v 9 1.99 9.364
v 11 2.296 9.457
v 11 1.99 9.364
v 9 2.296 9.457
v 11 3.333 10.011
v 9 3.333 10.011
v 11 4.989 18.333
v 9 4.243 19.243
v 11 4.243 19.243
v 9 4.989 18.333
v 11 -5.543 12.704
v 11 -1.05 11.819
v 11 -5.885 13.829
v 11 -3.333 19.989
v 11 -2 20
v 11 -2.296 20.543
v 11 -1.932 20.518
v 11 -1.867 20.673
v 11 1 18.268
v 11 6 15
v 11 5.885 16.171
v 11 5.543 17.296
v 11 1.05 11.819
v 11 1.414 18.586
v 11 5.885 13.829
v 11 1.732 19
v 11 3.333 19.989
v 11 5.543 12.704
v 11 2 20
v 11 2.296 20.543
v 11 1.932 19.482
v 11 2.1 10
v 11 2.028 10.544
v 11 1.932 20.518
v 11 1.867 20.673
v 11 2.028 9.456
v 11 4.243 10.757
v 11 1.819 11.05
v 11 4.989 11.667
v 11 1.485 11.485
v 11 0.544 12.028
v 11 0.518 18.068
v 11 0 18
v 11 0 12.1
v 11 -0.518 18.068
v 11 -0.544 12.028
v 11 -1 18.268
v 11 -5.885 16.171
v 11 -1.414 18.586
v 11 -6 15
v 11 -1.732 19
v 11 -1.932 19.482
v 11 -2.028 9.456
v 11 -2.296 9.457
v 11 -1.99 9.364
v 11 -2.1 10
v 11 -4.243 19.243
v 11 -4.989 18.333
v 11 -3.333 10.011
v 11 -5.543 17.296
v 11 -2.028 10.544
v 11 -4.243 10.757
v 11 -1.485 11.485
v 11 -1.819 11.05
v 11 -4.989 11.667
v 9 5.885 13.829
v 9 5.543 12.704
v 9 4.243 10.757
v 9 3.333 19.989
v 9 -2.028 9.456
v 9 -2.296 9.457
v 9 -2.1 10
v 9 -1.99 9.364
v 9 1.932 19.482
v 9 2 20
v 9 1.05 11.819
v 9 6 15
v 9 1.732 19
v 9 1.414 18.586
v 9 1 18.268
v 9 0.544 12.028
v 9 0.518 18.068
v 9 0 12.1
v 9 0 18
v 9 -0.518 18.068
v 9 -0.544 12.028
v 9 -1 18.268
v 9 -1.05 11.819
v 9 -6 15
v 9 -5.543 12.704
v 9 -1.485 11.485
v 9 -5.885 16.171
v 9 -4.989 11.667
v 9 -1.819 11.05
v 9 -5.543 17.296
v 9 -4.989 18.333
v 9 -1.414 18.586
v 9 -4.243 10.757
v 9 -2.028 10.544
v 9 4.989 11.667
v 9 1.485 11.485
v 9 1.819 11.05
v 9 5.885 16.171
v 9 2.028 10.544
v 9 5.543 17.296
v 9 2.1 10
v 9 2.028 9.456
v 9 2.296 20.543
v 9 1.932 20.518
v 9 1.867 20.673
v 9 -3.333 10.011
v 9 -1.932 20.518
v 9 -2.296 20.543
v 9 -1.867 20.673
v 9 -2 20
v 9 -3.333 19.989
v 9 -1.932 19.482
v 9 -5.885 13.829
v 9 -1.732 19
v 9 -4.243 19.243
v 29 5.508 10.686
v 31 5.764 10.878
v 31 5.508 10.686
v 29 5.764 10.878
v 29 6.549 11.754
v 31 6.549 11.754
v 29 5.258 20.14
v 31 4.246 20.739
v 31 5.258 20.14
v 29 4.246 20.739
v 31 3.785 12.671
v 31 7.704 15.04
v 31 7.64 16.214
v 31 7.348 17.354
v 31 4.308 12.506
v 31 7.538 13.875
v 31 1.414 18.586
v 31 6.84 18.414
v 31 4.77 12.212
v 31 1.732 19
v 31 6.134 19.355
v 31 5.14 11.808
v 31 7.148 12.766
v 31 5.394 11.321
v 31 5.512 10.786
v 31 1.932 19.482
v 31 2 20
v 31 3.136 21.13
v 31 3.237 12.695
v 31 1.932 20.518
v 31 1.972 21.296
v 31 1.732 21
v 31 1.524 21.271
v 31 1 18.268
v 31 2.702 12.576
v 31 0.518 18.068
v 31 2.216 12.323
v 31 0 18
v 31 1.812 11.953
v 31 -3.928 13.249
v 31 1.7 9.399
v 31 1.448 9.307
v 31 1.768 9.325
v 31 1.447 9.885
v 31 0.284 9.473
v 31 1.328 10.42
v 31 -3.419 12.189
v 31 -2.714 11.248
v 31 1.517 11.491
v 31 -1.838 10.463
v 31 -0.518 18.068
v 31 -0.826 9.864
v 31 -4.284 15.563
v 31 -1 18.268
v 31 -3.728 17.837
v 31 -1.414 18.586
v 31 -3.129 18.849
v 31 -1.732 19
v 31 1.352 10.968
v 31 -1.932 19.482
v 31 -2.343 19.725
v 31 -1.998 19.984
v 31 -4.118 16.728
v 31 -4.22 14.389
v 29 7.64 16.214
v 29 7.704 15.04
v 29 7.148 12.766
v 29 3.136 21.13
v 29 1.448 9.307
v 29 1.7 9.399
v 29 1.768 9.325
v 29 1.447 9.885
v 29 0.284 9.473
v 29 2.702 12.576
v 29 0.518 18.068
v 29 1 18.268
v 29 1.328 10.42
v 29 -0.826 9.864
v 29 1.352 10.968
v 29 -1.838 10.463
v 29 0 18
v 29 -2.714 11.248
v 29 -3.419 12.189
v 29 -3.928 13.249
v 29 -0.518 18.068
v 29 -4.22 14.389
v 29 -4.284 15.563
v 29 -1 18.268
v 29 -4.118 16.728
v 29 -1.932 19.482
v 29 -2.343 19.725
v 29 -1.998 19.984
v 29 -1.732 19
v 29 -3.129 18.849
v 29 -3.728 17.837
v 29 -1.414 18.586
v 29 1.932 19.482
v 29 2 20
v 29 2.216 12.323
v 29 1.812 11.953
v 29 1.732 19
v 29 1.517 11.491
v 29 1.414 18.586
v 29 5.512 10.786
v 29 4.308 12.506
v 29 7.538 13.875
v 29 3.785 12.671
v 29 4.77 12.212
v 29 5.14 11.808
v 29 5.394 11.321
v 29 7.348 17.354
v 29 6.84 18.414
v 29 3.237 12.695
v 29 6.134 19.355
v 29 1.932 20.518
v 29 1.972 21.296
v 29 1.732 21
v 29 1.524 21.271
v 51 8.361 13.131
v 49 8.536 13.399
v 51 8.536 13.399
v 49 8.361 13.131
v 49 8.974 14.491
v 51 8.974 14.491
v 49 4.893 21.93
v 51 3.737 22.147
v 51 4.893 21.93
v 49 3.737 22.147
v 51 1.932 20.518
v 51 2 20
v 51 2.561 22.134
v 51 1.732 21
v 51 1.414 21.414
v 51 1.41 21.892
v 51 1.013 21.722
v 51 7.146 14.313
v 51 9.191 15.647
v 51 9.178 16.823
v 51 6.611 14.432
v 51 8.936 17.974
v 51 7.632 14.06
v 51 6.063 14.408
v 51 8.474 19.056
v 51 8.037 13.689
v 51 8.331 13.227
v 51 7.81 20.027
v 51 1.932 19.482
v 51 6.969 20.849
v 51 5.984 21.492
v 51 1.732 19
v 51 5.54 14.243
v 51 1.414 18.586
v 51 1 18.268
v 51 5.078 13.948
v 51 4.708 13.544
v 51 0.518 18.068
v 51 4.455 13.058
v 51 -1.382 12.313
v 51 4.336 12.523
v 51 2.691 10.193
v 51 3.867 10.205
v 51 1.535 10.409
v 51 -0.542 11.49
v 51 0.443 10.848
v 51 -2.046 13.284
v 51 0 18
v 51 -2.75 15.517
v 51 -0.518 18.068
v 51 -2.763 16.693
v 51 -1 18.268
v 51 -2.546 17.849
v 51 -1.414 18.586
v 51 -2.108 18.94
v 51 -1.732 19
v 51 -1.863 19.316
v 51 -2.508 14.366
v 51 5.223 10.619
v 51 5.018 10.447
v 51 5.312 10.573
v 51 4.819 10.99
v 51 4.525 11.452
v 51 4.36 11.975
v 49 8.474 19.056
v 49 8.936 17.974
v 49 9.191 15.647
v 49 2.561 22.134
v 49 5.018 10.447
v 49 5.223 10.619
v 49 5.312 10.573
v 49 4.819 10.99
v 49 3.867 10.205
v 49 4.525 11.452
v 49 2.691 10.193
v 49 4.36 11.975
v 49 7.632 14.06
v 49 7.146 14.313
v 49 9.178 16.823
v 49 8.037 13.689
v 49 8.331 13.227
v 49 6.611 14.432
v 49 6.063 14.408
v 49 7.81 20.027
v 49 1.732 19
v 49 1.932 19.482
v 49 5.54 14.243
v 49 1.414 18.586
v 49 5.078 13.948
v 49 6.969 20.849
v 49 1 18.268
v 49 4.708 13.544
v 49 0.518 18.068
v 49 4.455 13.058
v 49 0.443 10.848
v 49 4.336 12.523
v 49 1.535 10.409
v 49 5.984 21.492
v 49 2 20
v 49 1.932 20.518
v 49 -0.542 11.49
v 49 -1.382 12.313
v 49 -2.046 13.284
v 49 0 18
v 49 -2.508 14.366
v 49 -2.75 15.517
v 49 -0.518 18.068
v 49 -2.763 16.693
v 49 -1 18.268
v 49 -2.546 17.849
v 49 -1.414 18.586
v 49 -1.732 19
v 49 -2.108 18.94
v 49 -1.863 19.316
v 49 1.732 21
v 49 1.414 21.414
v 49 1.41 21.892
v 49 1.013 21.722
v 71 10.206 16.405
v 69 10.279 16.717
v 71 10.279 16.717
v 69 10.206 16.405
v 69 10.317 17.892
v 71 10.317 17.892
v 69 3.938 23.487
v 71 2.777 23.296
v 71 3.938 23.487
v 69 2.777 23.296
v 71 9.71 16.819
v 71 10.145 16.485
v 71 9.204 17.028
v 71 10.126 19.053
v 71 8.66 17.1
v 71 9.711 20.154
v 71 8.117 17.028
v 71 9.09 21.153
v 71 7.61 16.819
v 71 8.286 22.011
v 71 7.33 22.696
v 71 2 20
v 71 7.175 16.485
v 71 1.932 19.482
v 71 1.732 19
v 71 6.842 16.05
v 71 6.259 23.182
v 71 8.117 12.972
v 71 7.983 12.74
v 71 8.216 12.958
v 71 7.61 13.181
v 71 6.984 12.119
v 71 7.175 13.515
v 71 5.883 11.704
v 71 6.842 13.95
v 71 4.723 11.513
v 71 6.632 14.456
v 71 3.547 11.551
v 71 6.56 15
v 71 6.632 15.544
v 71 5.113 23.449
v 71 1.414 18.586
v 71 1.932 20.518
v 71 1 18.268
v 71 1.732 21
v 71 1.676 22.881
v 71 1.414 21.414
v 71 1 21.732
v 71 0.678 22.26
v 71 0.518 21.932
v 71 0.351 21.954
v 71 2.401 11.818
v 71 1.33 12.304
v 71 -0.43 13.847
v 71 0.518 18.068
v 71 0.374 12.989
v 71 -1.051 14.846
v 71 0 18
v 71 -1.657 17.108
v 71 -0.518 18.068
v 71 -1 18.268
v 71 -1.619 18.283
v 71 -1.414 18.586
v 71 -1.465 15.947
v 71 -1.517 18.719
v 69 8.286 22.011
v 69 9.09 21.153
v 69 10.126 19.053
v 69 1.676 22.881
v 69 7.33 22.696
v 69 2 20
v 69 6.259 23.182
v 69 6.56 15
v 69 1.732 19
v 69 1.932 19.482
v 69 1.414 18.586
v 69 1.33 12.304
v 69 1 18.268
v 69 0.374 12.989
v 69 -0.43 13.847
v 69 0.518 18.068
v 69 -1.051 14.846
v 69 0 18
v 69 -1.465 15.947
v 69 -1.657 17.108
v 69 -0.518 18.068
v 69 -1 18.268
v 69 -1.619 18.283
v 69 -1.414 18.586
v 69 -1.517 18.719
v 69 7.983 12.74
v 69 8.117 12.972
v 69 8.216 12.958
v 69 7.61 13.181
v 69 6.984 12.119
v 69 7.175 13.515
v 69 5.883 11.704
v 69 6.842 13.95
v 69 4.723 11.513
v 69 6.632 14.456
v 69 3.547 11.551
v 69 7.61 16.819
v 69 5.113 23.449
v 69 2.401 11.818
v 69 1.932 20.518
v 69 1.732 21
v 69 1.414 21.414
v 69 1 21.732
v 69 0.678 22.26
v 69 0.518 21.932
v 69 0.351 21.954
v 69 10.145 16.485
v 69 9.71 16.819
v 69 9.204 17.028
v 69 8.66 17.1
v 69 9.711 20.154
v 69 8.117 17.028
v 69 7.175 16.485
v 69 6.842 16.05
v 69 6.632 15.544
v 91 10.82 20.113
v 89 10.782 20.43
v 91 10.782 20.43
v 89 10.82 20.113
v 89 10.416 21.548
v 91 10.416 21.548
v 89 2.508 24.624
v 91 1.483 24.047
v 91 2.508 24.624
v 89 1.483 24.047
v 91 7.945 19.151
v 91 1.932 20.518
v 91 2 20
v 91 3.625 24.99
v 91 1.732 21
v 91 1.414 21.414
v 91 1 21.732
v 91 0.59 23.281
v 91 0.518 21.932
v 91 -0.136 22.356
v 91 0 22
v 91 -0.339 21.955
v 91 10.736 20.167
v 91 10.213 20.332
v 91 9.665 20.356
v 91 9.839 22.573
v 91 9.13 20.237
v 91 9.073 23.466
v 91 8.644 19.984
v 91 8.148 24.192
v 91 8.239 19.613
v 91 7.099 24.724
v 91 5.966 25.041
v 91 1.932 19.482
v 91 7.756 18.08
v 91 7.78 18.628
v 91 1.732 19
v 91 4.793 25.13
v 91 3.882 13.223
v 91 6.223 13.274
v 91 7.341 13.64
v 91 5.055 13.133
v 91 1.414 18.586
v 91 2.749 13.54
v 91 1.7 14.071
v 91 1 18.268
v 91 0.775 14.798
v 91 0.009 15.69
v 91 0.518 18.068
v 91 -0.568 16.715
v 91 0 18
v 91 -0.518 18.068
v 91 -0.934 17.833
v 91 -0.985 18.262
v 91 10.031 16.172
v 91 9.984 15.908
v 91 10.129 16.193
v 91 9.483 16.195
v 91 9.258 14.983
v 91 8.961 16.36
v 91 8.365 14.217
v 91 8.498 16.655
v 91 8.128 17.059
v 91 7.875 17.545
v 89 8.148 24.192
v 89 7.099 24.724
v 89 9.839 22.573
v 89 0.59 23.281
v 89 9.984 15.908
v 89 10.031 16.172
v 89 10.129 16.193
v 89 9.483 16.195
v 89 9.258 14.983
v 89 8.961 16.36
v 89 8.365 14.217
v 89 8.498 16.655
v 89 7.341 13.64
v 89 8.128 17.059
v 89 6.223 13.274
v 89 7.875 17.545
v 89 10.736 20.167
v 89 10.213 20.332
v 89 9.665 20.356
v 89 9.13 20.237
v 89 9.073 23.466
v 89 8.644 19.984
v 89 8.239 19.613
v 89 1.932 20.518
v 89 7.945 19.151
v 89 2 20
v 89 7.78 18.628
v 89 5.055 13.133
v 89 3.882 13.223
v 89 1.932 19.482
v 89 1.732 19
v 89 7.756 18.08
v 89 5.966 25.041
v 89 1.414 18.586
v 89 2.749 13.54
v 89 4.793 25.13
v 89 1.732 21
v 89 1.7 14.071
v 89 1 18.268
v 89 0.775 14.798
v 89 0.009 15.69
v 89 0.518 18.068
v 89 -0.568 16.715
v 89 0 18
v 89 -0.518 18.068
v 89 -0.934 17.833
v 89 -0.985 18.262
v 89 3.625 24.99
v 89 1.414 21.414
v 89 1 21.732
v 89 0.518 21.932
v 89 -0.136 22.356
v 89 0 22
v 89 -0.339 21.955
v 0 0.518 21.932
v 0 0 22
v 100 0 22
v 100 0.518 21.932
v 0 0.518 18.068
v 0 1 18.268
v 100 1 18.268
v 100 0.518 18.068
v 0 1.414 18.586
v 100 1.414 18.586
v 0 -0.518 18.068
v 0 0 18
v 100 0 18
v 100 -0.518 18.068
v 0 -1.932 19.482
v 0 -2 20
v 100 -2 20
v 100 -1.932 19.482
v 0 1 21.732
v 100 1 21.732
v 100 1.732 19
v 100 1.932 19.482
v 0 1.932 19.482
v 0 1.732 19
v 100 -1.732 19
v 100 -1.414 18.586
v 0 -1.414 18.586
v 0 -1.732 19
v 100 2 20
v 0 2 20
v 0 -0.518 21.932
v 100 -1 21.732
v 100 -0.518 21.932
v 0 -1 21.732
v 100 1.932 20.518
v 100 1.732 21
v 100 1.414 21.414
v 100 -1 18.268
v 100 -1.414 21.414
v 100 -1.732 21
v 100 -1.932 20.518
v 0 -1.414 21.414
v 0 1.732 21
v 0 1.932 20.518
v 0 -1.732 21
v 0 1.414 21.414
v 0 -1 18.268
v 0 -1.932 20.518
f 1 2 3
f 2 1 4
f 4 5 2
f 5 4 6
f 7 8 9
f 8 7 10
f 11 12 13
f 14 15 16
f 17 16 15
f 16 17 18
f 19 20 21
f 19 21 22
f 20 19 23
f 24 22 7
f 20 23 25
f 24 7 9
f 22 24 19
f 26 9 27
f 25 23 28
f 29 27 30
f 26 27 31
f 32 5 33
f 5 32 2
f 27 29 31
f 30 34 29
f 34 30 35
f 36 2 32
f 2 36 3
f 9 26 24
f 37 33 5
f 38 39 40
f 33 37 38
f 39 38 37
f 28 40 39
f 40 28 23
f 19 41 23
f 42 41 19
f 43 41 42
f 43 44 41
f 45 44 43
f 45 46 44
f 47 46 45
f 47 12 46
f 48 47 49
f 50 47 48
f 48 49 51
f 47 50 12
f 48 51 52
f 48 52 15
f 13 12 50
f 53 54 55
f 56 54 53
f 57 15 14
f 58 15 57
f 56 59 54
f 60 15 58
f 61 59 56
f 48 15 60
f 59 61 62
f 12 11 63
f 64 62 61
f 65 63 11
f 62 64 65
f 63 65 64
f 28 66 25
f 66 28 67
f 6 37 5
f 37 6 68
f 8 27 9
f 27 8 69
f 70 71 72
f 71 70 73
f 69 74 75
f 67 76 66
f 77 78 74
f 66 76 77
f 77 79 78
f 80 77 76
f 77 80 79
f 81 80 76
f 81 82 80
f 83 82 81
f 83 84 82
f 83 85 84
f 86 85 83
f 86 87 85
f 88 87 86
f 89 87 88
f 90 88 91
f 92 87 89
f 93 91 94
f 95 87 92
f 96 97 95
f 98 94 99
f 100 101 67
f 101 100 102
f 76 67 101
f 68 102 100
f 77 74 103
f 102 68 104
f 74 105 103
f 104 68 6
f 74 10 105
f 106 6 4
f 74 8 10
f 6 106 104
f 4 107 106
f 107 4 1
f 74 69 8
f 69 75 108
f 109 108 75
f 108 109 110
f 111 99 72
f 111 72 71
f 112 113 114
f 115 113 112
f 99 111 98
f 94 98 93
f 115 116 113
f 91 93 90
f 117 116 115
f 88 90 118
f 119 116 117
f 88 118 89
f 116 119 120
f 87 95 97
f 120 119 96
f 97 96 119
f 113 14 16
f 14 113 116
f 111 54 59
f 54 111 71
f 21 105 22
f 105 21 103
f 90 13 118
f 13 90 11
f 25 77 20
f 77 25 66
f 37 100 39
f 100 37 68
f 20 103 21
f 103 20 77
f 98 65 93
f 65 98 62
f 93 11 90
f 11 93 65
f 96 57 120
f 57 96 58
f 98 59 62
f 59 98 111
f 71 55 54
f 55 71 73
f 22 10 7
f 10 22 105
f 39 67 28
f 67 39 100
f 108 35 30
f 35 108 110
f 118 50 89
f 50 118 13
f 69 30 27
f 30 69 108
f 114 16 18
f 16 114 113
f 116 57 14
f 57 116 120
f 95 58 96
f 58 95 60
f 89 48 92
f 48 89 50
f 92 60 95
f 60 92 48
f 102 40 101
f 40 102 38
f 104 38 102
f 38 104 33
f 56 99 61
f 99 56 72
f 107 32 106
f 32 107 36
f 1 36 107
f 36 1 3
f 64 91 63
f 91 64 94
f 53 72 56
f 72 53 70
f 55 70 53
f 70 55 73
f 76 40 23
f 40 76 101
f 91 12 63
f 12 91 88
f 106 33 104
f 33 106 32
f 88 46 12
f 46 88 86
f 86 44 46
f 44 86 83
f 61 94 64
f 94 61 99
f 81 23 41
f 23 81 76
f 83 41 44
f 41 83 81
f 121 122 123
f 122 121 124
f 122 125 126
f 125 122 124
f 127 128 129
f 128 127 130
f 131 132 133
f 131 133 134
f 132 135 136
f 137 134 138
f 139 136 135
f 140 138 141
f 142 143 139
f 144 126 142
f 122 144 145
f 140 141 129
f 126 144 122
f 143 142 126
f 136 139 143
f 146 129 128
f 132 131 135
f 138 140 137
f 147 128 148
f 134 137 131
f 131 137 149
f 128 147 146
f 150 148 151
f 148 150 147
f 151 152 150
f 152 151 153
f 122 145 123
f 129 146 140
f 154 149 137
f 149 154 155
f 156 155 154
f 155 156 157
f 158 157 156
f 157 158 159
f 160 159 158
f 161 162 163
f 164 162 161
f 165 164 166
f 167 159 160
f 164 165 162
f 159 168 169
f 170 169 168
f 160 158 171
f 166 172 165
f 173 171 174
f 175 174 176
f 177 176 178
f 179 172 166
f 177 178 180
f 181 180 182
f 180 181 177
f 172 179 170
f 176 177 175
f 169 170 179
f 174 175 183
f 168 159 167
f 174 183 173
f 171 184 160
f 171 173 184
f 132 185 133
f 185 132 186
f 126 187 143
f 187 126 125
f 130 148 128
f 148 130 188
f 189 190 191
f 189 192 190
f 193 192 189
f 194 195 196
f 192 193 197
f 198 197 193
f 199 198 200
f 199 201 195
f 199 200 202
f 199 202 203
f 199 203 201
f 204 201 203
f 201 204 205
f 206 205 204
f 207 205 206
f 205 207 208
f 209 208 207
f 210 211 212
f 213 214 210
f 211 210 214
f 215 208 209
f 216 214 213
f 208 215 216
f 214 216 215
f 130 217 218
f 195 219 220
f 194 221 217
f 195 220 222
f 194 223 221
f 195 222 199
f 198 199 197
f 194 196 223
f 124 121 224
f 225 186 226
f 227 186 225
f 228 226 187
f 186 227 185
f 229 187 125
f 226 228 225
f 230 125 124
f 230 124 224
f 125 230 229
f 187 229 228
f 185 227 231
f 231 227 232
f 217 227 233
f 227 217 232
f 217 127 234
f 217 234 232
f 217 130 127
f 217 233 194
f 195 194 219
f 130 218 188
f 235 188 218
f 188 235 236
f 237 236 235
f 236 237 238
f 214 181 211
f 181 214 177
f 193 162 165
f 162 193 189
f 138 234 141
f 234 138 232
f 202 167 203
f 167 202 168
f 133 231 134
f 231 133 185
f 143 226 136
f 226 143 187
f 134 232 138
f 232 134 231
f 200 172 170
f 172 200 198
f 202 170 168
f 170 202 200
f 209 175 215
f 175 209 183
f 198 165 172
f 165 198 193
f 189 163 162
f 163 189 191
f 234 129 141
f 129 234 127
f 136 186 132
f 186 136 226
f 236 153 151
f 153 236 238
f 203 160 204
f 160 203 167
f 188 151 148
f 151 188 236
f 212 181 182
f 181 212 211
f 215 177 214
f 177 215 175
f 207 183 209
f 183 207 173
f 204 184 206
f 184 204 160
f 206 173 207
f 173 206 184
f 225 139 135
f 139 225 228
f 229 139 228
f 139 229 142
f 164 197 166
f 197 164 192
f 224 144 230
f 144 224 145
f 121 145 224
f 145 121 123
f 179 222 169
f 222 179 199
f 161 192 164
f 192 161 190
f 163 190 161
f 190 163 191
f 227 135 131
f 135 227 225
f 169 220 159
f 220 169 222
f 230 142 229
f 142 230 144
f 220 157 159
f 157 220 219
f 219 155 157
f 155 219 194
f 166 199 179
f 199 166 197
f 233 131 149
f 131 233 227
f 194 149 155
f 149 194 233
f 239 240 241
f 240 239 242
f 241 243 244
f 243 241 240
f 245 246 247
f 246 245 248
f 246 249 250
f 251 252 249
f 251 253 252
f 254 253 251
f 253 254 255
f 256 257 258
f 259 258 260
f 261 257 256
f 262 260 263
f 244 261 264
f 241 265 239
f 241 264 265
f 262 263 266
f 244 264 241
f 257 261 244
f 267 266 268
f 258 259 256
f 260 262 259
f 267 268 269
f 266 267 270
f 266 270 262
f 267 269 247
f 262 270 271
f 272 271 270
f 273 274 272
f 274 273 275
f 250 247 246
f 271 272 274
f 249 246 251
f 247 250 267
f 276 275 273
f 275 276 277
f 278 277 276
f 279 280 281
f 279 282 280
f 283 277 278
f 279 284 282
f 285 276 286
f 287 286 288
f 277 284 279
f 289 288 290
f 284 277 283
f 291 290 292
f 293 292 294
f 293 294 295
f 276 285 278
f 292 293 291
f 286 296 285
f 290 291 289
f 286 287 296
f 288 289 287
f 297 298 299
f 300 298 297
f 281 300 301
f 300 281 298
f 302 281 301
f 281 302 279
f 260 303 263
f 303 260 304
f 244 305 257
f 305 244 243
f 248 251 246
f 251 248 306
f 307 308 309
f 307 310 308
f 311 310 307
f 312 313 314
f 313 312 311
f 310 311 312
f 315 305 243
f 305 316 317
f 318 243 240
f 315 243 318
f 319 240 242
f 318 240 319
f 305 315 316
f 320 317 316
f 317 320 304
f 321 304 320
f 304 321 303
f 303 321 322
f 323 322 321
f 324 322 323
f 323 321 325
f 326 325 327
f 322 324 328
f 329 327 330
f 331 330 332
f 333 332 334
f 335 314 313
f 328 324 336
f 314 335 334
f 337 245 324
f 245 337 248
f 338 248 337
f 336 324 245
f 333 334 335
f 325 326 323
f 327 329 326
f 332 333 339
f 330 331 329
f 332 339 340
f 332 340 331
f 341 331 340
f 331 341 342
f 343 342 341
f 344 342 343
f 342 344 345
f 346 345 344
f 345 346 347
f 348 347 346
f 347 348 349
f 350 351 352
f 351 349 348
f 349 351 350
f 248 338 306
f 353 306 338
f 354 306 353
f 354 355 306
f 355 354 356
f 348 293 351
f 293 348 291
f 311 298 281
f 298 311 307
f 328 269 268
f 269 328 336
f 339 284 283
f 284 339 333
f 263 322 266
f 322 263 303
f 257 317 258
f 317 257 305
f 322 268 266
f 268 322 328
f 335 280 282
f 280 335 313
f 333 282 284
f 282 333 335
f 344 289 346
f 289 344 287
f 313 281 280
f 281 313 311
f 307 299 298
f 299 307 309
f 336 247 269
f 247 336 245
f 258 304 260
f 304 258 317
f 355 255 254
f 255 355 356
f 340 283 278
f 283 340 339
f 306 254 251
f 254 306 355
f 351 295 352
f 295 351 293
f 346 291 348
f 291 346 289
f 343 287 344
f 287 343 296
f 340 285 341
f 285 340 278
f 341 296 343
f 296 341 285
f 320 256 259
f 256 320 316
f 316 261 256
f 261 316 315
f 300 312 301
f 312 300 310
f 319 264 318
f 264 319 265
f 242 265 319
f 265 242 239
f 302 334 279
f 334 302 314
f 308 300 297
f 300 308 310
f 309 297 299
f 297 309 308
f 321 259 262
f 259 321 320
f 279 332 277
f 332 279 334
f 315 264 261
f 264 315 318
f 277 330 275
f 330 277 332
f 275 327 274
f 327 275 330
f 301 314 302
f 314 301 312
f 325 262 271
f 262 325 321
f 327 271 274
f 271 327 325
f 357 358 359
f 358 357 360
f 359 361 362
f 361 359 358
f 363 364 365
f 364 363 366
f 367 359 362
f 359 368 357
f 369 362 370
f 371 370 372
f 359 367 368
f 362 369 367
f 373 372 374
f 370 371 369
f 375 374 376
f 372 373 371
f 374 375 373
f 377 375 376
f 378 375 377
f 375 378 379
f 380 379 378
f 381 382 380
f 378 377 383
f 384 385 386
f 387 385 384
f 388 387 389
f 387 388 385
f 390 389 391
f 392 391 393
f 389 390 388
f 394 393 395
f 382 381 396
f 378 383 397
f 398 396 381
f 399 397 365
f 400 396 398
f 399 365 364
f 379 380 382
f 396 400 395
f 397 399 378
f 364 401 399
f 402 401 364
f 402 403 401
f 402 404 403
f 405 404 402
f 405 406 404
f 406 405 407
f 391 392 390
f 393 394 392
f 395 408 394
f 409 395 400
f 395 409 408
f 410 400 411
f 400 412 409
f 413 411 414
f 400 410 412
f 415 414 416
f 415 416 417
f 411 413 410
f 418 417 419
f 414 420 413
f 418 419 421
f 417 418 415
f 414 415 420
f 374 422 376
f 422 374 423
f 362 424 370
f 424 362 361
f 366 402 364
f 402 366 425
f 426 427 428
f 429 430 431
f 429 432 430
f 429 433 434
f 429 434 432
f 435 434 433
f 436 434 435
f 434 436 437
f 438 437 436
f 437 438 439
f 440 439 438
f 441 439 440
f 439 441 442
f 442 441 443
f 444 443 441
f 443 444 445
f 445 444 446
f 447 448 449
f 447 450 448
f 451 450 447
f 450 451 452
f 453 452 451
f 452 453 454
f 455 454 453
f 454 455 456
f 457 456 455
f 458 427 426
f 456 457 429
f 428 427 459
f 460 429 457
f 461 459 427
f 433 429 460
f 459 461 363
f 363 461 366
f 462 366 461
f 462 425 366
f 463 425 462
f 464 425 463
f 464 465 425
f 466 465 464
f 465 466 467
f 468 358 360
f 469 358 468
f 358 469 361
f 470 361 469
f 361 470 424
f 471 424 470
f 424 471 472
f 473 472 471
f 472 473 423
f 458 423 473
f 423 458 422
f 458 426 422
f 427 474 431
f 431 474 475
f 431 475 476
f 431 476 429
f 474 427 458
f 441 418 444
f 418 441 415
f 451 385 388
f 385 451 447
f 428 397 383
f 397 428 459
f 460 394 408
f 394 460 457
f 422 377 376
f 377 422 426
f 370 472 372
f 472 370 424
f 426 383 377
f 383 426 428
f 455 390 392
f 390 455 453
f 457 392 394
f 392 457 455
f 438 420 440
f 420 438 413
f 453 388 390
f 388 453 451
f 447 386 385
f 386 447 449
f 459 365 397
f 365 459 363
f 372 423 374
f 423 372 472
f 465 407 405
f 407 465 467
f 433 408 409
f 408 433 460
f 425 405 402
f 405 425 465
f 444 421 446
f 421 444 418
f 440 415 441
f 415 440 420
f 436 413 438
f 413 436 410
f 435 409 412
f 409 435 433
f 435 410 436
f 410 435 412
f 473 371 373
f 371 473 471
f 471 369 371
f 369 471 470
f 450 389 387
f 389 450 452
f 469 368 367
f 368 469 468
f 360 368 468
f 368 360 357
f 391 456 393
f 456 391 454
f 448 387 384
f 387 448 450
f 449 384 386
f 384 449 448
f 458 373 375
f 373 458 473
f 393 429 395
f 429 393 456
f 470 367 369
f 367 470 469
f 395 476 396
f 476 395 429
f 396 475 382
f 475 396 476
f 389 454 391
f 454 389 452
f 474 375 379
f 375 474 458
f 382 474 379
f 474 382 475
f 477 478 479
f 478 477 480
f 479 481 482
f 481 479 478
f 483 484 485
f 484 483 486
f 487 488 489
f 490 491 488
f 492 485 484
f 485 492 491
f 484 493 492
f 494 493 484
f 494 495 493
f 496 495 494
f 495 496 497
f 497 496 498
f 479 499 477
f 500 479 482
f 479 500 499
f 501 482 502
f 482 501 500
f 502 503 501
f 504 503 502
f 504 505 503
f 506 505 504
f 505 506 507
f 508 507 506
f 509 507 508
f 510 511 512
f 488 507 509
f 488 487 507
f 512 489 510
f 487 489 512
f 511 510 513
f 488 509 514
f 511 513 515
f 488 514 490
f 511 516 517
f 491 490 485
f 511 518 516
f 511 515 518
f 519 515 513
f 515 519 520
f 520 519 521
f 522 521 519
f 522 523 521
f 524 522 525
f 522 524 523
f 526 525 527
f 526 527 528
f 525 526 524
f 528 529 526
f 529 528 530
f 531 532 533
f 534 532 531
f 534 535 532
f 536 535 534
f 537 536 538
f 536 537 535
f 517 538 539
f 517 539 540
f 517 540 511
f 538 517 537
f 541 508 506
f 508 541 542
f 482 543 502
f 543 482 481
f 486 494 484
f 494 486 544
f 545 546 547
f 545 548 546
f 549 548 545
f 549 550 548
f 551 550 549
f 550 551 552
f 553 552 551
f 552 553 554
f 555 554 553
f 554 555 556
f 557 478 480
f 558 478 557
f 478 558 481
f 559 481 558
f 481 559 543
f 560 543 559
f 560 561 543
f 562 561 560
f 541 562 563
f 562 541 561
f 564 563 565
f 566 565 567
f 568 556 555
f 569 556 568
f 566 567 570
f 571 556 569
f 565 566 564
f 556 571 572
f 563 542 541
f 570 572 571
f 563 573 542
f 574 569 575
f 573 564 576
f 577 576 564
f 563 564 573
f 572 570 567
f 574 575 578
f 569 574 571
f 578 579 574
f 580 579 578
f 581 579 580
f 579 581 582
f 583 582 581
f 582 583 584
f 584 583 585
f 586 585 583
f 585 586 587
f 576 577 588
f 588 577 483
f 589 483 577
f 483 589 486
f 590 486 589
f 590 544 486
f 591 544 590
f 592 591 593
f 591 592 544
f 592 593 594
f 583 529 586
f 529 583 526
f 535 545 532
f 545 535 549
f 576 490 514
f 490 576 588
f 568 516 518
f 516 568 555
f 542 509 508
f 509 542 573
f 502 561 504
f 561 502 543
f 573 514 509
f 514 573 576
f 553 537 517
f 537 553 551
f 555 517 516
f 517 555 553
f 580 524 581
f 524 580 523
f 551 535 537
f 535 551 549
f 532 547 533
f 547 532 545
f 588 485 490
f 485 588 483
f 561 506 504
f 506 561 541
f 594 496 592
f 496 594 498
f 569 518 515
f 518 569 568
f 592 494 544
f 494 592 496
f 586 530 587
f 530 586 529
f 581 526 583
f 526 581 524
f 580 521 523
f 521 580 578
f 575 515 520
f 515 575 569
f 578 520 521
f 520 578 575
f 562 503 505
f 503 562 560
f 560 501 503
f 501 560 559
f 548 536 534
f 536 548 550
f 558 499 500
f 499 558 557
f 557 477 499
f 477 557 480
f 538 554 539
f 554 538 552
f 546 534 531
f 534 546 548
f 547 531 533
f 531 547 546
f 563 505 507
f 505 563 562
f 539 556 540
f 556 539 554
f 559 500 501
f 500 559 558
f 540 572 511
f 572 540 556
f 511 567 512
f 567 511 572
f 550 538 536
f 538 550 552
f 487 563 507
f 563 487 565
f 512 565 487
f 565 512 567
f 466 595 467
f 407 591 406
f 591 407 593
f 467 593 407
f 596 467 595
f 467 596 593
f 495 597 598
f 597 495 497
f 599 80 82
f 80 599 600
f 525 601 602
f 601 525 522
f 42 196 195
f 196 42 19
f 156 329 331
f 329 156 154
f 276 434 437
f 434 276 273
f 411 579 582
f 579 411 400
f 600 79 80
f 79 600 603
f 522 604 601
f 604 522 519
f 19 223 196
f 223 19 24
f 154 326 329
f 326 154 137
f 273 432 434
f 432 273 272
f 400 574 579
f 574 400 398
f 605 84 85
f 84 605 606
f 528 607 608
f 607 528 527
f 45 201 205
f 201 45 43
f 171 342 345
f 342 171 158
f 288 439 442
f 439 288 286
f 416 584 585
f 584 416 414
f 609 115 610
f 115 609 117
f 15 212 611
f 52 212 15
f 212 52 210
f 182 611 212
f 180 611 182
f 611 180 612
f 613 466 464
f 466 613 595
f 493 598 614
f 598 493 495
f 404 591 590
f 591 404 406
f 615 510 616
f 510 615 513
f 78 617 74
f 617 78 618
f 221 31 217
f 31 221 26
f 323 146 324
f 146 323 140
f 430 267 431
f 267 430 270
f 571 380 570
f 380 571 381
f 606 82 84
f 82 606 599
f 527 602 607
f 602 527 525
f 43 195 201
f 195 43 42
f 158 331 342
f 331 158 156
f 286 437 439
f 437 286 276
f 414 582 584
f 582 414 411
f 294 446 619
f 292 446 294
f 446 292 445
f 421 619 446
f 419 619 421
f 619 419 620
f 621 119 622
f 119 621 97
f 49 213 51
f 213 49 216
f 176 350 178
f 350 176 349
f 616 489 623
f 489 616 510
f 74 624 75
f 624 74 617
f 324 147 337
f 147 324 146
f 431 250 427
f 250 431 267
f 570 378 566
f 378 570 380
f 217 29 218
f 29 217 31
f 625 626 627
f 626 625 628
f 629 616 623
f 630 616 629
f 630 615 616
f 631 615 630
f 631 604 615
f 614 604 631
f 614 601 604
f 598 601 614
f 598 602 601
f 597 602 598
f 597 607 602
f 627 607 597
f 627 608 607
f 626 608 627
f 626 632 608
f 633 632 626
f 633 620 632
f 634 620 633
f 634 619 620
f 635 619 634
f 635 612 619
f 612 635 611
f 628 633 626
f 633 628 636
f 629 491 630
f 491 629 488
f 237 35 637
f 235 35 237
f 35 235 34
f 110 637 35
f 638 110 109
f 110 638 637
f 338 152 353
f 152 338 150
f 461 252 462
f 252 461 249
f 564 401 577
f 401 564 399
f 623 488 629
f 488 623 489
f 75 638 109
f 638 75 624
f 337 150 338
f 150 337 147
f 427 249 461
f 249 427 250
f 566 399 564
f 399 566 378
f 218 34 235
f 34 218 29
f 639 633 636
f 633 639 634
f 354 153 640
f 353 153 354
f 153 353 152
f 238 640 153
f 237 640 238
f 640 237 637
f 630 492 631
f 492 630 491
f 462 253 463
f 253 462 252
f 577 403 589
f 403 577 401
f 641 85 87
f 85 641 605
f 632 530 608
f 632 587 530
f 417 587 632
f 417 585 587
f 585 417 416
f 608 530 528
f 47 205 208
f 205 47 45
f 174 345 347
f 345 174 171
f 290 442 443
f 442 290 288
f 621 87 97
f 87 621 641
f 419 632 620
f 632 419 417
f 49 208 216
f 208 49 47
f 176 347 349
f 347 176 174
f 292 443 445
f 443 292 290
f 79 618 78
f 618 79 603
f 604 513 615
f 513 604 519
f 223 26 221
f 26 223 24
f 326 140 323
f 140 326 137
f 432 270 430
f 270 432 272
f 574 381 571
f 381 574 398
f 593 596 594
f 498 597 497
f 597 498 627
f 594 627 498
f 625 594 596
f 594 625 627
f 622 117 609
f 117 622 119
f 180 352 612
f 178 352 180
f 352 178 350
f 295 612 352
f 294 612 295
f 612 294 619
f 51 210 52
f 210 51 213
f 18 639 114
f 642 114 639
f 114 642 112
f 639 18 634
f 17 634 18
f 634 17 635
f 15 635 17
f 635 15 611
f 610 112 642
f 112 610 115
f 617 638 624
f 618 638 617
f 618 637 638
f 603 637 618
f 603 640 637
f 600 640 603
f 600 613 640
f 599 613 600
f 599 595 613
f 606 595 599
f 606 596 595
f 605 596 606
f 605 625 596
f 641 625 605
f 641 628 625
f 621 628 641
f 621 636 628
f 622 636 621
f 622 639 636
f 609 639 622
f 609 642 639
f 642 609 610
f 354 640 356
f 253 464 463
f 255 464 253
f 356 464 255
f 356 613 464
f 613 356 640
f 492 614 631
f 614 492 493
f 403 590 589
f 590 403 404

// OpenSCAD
// MINIMAL TEST - Wave Ocean v8 stripped to basics

echo("Starting minimal test...");

// Simple parameters
SHAFT_DIAMETER = 4;
DISC_DIAMETER = 12;
DISC_THICKNESS = 2;
ECCENTRICITY = 5;

theta = $t * 360;  // Animation angle

// Single disc module
module eccentric_disc() {
    color("blue")
    difference() {
        cylinder(h=DISC_THICKNESS, d=DISC_DIAMETER, center=true, $fn=32);
        translate([ECCENTRICITY, 0, 0])
            cylinder(h=DISC_THICKNESS + 1, d=4.2, center=true, $fn=24);
    }
}

// Mounted disc that rotates around shaft
module mounted_disc(angle) {
    rotate([angle, 0, 0])           // Rotate around X (shaft axis)
        translate([0, 0, -ECCENTRICITY])  // Offset so hole aligns with shaft
            rotate([0, 90, 0])      // Orient disc perpendicular to shaft
                eccentric_disc();
}

// Single shaft with 5 discs
module single_camshaft() {
    // Shaft
    color("gray")
    rotate([0, 90, 0])
        cylinder(d=SHAFT_DIAMETER, h=100, $fn=24);

    // 5 discs along shaft
    for (i = [0:4]) {
        translate([10 + i * 20, 0, 0])
            mounted_disc(theta + i * 20);  // Staggered phase
    }
}

// Render at visible height
translate([0, 0, 20])
    single_camshaft();

// Ground plane for reference
%cube([120, 40, 1], center=true);

echo("Minimal test complete - you should see a shaft with 5 blue discs");
